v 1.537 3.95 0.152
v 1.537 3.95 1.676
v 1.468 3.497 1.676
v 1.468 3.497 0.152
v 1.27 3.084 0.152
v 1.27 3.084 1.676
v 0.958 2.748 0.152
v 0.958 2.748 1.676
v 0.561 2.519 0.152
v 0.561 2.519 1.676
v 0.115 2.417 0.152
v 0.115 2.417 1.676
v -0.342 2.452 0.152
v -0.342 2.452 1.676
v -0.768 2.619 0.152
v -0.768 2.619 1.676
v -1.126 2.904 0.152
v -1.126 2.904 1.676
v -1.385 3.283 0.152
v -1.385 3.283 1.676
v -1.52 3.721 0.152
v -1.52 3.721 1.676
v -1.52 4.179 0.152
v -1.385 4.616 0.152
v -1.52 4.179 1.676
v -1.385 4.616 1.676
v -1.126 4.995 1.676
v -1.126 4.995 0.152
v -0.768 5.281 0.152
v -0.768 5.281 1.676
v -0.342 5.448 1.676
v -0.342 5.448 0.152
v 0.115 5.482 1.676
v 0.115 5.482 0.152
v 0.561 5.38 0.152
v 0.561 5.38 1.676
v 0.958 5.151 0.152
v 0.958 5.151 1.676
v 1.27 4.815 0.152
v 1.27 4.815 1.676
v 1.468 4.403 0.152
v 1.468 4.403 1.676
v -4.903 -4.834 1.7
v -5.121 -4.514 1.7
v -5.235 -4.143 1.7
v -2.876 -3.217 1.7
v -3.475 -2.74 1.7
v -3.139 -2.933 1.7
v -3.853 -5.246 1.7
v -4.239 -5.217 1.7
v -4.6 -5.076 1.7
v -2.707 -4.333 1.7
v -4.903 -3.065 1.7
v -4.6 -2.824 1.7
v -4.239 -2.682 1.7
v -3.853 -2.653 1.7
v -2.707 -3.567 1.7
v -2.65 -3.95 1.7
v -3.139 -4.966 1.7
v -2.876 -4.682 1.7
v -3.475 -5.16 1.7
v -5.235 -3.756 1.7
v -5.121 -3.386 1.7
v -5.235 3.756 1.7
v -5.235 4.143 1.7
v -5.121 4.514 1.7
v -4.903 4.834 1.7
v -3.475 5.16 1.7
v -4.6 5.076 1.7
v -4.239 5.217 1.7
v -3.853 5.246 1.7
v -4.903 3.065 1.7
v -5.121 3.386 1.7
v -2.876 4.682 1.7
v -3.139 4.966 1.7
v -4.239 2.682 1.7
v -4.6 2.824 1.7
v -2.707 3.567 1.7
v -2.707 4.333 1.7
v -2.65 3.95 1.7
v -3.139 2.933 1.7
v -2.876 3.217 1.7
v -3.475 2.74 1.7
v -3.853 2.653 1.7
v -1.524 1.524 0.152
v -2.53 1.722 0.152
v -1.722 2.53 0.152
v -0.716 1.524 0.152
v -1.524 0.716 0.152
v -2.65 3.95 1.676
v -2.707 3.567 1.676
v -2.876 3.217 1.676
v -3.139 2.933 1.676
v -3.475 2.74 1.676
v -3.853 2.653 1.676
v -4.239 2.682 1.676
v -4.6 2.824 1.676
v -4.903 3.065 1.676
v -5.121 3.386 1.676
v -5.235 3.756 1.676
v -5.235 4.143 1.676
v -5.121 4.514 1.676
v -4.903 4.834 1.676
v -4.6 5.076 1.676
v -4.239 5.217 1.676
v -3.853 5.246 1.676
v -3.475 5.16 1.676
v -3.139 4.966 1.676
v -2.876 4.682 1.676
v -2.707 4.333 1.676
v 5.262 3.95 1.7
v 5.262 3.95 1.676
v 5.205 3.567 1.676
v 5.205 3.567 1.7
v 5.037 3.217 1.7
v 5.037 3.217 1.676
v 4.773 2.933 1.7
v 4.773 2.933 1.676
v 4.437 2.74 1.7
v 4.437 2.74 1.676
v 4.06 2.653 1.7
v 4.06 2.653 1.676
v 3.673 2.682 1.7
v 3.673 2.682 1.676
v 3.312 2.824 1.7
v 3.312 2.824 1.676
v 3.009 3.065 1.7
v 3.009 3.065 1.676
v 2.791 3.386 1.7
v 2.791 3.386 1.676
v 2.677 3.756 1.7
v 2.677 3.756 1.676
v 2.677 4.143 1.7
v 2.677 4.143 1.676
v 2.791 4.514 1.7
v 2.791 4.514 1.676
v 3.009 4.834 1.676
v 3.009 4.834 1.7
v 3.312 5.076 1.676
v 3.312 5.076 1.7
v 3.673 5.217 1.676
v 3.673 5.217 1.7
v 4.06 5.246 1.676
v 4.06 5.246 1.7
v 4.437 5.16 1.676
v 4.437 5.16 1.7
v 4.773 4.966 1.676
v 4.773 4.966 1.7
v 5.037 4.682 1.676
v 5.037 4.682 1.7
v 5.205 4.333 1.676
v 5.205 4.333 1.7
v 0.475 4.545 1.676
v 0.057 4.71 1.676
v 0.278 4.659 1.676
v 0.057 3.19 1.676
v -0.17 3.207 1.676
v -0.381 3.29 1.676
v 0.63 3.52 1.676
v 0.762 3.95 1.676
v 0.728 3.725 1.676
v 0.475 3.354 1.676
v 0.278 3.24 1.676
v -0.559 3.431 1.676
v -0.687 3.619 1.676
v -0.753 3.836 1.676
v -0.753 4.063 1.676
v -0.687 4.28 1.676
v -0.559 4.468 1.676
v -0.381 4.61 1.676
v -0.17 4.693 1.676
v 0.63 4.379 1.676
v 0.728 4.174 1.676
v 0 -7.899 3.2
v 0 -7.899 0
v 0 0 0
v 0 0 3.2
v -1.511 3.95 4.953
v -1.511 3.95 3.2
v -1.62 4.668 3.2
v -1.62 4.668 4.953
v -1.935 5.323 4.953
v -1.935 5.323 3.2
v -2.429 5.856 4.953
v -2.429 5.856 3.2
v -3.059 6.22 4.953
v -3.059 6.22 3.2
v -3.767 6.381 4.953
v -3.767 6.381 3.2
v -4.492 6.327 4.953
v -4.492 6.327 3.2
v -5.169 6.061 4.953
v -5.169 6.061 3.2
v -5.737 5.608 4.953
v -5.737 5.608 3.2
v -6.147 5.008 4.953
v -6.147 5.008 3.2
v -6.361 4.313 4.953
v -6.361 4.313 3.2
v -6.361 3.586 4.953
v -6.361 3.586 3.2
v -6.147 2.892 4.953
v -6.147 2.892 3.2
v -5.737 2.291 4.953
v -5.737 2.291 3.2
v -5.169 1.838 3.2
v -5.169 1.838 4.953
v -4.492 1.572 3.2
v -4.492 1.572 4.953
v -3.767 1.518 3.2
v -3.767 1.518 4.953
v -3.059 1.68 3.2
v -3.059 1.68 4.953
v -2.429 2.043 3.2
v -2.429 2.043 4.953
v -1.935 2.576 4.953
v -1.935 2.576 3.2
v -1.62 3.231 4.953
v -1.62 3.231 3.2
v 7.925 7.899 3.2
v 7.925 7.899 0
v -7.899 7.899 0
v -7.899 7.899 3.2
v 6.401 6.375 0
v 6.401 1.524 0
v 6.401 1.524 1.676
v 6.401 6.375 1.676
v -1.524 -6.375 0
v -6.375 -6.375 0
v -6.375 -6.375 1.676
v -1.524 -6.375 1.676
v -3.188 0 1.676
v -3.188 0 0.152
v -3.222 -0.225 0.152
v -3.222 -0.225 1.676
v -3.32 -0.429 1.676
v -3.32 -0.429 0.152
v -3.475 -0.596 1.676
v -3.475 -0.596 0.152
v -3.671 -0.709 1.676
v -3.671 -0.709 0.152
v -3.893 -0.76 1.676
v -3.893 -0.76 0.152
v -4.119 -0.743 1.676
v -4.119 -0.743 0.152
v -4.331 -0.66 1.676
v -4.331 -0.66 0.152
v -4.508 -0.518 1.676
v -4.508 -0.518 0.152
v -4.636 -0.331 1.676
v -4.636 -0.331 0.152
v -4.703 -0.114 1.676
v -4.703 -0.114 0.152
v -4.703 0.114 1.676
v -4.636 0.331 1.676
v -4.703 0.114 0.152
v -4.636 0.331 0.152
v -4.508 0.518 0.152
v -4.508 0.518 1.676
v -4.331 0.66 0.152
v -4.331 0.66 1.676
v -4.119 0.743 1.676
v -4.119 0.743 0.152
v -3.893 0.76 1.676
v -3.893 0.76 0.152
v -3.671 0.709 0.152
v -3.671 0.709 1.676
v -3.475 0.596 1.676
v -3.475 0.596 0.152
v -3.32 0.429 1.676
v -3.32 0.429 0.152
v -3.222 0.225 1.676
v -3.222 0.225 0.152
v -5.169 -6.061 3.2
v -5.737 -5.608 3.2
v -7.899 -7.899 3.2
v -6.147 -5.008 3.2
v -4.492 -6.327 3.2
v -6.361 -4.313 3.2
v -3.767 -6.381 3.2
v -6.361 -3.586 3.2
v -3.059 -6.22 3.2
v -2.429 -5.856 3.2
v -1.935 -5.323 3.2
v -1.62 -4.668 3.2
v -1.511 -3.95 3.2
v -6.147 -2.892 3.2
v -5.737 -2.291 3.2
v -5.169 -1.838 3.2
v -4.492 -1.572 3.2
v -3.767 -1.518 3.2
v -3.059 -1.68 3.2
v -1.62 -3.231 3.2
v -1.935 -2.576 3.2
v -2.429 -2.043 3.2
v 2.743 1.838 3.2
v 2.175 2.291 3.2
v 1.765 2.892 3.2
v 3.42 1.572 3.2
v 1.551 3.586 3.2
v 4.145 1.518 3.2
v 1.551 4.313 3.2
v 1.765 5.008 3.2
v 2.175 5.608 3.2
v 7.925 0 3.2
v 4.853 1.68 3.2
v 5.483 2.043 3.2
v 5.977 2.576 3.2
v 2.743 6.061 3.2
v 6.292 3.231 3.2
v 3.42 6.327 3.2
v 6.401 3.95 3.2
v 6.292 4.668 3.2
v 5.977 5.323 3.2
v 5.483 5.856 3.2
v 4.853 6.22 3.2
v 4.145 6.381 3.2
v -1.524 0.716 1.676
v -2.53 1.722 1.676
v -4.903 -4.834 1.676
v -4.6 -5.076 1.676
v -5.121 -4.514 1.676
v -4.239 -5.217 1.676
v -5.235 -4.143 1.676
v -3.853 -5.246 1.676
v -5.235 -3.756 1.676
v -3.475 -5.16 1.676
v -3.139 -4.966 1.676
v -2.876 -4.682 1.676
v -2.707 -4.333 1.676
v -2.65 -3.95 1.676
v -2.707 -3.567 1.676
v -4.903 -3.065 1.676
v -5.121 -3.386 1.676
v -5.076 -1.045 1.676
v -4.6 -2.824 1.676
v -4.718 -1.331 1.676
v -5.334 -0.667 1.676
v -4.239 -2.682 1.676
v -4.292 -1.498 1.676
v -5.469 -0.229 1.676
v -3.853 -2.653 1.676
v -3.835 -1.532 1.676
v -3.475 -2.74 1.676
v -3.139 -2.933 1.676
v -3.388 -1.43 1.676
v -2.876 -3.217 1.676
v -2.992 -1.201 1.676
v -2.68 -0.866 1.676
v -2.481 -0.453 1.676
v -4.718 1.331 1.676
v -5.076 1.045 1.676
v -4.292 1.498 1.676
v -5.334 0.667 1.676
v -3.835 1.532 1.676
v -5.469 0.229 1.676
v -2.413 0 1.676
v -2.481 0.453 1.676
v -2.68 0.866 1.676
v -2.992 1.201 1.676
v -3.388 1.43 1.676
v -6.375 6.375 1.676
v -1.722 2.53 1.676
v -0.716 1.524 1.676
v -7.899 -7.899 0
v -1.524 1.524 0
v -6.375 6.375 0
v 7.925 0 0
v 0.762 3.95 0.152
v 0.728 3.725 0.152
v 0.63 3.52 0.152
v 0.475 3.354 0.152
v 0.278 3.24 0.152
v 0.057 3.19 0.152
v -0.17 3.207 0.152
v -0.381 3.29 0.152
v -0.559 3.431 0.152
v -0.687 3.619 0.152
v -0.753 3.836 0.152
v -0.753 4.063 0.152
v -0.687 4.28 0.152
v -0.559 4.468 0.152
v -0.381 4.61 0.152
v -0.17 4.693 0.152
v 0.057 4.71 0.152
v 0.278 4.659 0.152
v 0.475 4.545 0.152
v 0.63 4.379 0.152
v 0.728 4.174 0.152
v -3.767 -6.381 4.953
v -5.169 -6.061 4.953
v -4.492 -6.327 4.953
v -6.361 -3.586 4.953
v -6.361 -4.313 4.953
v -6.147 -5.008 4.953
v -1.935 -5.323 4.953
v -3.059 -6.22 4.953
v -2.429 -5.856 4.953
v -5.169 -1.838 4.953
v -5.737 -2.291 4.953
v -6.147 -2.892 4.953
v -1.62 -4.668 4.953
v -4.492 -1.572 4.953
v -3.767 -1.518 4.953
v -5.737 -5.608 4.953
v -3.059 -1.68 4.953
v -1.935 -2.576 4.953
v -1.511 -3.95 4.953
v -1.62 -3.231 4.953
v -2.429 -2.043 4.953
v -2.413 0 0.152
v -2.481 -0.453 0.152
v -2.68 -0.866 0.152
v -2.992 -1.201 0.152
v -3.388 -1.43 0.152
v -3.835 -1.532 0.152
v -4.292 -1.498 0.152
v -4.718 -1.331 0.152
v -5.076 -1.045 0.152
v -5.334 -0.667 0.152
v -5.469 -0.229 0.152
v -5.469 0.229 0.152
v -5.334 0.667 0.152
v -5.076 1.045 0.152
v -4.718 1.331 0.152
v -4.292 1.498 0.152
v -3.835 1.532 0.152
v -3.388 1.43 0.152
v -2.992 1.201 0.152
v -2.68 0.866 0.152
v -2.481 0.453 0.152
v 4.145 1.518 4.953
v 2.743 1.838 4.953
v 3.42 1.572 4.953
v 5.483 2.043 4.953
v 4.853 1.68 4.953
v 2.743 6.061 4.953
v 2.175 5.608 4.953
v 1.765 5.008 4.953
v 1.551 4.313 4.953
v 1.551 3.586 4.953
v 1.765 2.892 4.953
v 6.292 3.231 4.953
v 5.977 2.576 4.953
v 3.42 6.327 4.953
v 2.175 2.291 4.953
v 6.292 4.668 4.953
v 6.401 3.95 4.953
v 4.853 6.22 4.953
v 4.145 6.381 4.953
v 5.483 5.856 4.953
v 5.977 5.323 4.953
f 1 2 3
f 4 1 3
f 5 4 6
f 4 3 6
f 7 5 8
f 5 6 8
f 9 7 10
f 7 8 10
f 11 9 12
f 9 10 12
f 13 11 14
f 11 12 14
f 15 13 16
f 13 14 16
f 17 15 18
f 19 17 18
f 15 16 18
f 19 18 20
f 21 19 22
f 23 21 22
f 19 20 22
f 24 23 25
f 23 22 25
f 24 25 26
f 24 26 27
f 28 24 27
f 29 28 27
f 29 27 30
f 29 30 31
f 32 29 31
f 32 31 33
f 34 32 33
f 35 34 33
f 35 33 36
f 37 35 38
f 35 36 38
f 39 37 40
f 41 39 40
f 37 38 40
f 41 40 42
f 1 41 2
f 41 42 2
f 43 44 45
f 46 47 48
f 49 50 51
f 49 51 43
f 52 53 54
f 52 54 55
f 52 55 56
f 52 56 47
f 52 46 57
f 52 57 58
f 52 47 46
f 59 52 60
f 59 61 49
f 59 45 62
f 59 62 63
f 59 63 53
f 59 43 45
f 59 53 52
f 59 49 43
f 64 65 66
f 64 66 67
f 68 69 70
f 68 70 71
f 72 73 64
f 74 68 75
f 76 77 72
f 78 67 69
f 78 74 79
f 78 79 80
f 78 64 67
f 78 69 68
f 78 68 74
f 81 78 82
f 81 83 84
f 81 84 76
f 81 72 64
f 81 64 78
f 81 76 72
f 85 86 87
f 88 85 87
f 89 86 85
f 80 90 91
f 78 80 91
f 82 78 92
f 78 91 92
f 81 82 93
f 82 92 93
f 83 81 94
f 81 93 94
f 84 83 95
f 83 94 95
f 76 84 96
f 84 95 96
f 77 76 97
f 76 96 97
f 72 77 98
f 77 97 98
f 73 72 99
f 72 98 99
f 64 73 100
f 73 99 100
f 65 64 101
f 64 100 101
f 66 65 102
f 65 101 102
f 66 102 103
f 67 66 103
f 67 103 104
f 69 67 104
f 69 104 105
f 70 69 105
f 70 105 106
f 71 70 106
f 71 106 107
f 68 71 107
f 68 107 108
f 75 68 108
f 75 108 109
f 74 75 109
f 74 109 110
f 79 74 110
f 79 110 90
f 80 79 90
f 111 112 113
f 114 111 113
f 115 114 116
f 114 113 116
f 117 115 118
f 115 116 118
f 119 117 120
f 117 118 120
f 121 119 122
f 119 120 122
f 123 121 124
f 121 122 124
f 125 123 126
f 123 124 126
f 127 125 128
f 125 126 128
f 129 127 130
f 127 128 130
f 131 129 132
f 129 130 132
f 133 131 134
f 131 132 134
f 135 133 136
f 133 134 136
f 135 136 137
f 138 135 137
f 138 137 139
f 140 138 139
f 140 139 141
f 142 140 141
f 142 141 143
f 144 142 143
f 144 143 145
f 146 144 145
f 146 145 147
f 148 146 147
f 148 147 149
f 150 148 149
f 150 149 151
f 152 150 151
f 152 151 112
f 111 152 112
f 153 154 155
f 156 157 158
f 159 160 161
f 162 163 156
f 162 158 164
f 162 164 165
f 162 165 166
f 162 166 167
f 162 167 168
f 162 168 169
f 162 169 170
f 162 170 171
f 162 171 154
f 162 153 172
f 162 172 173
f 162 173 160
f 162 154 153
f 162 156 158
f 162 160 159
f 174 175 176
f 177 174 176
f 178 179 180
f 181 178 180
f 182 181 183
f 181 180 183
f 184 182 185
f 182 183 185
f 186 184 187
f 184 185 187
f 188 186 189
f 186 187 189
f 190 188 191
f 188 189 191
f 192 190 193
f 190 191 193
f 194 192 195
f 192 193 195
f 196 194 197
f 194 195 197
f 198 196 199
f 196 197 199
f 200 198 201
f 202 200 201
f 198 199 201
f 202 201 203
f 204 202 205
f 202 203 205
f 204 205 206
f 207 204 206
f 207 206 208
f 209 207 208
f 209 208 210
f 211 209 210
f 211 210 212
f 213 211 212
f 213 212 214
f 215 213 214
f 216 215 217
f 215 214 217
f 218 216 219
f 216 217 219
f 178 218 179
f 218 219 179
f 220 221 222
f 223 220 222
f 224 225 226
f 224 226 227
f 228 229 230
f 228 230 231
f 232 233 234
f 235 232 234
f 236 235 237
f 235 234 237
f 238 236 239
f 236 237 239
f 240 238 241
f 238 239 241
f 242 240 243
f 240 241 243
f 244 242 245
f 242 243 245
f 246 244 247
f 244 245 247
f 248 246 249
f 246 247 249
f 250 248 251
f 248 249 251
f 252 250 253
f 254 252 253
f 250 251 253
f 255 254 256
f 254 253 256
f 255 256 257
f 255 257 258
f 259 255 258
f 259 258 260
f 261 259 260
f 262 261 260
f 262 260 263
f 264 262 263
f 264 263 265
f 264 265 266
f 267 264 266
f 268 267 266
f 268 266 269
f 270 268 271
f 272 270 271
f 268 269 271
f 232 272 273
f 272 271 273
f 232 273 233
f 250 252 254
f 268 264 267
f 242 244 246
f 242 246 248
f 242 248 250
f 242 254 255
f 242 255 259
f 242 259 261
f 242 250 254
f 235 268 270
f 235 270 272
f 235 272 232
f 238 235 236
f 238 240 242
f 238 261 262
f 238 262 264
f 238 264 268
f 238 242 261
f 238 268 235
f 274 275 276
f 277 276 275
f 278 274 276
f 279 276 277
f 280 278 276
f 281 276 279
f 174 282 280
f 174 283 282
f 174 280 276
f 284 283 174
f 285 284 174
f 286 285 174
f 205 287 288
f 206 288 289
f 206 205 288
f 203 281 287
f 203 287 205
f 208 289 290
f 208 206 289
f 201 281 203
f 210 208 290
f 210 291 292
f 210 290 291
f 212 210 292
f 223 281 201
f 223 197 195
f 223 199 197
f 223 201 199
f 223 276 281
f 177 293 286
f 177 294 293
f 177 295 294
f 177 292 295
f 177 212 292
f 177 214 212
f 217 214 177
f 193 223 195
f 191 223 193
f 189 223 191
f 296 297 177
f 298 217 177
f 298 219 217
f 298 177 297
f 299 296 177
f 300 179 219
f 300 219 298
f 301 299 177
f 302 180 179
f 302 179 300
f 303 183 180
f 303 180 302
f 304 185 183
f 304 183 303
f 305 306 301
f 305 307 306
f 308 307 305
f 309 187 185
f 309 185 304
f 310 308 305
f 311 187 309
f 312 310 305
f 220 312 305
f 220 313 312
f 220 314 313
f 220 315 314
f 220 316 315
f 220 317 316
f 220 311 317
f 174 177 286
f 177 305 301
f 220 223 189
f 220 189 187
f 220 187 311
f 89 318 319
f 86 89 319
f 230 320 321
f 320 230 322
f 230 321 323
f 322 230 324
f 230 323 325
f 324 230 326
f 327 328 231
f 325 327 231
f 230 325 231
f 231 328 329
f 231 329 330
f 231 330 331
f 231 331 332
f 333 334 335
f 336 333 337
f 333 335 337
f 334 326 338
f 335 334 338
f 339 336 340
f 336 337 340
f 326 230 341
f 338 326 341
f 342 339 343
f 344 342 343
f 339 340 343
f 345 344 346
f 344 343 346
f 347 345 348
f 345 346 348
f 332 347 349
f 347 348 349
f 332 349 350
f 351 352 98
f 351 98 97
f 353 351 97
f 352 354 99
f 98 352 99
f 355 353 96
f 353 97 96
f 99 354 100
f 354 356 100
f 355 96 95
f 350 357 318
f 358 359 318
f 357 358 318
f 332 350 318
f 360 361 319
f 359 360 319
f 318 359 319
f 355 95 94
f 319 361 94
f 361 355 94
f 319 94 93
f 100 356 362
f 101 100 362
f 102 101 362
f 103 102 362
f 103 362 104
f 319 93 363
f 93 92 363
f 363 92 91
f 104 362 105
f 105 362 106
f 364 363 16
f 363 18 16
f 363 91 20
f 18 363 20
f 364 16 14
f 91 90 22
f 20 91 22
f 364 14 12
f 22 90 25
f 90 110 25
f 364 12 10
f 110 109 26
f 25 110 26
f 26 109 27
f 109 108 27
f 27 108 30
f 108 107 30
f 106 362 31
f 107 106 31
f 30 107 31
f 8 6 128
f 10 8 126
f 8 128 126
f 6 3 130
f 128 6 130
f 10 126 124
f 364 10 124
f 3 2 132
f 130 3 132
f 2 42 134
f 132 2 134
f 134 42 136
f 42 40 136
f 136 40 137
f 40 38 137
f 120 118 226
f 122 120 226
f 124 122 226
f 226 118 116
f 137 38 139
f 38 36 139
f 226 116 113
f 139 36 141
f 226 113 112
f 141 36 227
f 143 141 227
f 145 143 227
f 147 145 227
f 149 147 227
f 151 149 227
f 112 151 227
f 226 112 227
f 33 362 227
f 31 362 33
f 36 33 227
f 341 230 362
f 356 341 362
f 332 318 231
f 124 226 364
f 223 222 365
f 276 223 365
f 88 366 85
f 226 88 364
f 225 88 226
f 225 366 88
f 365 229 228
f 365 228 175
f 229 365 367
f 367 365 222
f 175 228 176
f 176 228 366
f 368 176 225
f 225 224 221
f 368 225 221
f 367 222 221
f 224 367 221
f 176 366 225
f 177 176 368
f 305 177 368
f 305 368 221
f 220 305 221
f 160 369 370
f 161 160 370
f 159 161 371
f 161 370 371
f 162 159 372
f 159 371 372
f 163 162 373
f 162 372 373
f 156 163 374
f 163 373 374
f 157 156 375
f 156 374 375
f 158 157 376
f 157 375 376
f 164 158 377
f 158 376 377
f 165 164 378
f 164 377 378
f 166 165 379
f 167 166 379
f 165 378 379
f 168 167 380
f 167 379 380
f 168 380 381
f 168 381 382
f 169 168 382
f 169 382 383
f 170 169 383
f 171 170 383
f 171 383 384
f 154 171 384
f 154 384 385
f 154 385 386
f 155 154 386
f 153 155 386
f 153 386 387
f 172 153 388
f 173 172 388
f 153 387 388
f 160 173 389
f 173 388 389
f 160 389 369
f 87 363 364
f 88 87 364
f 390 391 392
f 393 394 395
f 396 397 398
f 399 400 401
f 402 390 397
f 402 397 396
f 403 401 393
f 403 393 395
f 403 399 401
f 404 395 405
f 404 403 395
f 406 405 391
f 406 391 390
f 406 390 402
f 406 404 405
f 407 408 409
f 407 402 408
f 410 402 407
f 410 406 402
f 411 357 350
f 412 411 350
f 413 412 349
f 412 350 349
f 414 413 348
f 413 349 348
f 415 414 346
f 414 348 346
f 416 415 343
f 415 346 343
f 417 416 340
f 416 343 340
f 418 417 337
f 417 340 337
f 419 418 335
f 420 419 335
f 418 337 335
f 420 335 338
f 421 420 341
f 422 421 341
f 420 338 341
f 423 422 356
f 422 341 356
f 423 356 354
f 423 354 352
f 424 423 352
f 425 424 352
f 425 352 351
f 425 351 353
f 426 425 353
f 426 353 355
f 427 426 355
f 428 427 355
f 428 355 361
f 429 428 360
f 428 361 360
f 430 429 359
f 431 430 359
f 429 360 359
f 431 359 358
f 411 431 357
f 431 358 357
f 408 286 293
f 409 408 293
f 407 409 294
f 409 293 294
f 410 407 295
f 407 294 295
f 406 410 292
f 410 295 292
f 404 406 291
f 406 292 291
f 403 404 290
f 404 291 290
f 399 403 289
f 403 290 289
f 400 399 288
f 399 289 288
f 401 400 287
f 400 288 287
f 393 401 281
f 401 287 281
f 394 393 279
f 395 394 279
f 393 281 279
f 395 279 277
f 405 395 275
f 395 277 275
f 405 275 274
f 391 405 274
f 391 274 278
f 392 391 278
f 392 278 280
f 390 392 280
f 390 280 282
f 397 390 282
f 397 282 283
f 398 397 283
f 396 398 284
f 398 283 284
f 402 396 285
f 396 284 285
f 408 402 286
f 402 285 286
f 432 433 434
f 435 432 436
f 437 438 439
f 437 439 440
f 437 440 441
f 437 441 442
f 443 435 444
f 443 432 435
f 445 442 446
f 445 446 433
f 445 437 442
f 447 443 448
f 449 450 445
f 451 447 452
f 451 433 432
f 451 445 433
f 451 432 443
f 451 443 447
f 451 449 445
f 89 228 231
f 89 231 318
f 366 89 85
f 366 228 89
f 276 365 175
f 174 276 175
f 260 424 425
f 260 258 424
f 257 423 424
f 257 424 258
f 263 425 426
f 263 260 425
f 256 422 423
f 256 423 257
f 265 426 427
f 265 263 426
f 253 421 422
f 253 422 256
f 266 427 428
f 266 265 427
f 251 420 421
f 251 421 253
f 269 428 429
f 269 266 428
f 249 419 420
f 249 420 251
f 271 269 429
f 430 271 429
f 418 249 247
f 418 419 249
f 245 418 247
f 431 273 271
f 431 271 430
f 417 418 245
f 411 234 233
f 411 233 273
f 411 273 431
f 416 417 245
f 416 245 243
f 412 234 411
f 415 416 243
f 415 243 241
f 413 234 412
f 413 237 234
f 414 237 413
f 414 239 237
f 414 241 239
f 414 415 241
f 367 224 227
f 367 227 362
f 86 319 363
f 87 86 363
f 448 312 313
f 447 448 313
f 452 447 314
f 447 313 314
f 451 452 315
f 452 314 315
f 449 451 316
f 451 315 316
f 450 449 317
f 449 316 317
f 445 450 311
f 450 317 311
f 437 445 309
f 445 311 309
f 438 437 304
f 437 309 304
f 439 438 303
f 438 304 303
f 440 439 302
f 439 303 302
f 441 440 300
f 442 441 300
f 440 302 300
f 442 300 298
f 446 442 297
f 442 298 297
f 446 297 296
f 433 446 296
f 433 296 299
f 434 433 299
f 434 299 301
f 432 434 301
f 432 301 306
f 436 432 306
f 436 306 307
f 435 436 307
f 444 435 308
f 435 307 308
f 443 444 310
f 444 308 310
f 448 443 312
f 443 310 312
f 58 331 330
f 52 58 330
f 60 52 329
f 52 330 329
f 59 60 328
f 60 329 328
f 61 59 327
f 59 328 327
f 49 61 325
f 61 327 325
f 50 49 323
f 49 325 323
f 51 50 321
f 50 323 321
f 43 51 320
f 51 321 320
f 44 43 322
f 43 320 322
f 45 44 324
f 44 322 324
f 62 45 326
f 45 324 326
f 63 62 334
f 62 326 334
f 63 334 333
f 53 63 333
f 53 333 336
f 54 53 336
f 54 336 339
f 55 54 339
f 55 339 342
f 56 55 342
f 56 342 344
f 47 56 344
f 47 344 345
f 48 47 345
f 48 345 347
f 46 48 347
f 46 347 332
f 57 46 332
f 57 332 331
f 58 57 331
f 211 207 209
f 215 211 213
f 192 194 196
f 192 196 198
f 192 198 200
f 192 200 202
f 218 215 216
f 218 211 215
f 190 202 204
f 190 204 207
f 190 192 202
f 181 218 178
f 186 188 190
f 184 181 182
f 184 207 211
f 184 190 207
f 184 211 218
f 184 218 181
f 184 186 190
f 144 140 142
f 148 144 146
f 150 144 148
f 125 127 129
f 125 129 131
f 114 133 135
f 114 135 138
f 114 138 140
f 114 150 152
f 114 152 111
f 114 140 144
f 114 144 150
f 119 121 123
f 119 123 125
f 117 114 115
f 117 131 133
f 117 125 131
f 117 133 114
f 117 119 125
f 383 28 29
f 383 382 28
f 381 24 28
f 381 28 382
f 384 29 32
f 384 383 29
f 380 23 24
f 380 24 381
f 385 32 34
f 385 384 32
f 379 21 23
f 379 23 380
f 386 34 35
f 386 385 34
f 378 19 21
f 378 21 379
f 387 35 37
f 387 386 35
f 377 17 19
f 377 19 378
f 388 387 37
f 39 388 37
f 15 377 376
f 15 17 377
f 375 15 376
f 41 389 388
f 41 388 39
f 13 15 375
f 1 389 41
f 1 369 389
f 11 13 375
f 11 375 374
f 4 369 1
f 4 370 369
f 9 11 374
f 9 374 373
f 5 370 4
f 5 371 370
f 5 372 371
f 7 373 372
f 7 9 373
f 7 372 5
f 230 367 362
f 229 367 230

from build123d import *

# Parameters (mm, degrees)
F1_DEPTH  = 3.2004
F2_T      = -1.524
F3_R      = 2.4384
F4_DEPTH  = 1.7526
F5_R      = 1.3
F6_DEPTH  = 1.7
F8_DEPTH  = 1.524
F9_R      = 1.5367
F10_DEPTH = 1.524
F11_R     = 0.762
F12_DEPTH = 1.524
F13_R     = 0.762
F14_DEPTH = 1.524


with BuildPart() as f1:
    # F0 (on Top) → F1 (new body)
    with BuildSketch(Plane.XY):
        Polygon((-7.8994, -7.8994), (0, -7.8994), (0, 0), (7.9248, 0), (7.9248, 7.8994), (-7.8994, 7.8994), (-7.8994, 0), align=None)
    extrude(amount=F1_DEPTH)

    # F2
    f2_openings = [f1.faces().sort_by_distance(p)[0] for p in [
        (-1.306686, 1.319386, 0),
    ]]
    offset(amount=F2_T, openings=f2_openings, kind=Kind.INTERSECTION)

    # F3 (on face) → F4 (join)
    with BuildSketch(Plane.XY.offset(3.2004)):
        with Locations((3.9624, 3.9497)):
            Circle(F3_R)
        with Locations((-3.9497, 3.9497)):
            Circle(F3_R)
        with Locations((-3.9497, -3.9497)):
            Circle(F3_R)
    extrude(amount=F4_DEPTH)

    # F5 (on face) → F6 (cut)
    with BuildSketch(Plane(origin=(0, 0, 0), x_dir=(1, 0, 0), z_dir=(0, 0, -1))):
        with Locations((-3.9497, 3.9497)):
            Circle(F5_R)
        with Locations((-3.9497, -3.9497)):
            Circle(F5_R)
        with Locations((3.9624, -3.9497)):
            Circle(F5_R)
    extrude(amount=-F6_DEPTH, mode=Mode.SUBTRACT)

    # F7 (on face) → F8 (join)
    with BuildSketch(Plane(origin=(0, 0, 1.6764), x_dir=(1, 0, 0), z_dir=(0, 0, -1))):
        Polygon((-0.7157769491, -1.524), (-1.524, -0.7157769491), (-2.5297886856, -1.7215656347), (-1.7215656347, -2.5297886856), align=None)
    extrude(amount=F8_DEPTH)

    # F9 (on face) → F10 (join)
    with BuildSketch(Plane(origin=(0, 0, 1.6764), x_dir=(1, 0, 0), z_dir=(0, 0, -1))):
        with Locations((-3.9497, 0)):
            Circle(F9_R)
        with Locations((0, -3.9497)):
            Circle(F9_R)
    extrude(amount=F10_DEPTH)

    # F11 (on face) → F12 (cut)
    with BuildSketch(Plane(origin=(0, 0, 0.1524), x_dir=(1, 0, 0), z_dir=(0, 0, -1))):
        with Locations((-3.9497, 0)):
            Circle(F11_R)
    extrude(amount=-F12_DEPTH, mode=Mode.SUBTRACT)

    # F13 (on face) → F14 (cut)
    with BuildSketch(Plane(origin=(0, 0, 0.1524), x_dir=(1, 0, 0), z_dir=(0, 0, -1))):
        with Locations((0, -3.9497)):
            Circle(F13_R)
    extrude(amount=-F14_DEPTH, mode=Mode.SUBTRACT)


solid = f1.part
